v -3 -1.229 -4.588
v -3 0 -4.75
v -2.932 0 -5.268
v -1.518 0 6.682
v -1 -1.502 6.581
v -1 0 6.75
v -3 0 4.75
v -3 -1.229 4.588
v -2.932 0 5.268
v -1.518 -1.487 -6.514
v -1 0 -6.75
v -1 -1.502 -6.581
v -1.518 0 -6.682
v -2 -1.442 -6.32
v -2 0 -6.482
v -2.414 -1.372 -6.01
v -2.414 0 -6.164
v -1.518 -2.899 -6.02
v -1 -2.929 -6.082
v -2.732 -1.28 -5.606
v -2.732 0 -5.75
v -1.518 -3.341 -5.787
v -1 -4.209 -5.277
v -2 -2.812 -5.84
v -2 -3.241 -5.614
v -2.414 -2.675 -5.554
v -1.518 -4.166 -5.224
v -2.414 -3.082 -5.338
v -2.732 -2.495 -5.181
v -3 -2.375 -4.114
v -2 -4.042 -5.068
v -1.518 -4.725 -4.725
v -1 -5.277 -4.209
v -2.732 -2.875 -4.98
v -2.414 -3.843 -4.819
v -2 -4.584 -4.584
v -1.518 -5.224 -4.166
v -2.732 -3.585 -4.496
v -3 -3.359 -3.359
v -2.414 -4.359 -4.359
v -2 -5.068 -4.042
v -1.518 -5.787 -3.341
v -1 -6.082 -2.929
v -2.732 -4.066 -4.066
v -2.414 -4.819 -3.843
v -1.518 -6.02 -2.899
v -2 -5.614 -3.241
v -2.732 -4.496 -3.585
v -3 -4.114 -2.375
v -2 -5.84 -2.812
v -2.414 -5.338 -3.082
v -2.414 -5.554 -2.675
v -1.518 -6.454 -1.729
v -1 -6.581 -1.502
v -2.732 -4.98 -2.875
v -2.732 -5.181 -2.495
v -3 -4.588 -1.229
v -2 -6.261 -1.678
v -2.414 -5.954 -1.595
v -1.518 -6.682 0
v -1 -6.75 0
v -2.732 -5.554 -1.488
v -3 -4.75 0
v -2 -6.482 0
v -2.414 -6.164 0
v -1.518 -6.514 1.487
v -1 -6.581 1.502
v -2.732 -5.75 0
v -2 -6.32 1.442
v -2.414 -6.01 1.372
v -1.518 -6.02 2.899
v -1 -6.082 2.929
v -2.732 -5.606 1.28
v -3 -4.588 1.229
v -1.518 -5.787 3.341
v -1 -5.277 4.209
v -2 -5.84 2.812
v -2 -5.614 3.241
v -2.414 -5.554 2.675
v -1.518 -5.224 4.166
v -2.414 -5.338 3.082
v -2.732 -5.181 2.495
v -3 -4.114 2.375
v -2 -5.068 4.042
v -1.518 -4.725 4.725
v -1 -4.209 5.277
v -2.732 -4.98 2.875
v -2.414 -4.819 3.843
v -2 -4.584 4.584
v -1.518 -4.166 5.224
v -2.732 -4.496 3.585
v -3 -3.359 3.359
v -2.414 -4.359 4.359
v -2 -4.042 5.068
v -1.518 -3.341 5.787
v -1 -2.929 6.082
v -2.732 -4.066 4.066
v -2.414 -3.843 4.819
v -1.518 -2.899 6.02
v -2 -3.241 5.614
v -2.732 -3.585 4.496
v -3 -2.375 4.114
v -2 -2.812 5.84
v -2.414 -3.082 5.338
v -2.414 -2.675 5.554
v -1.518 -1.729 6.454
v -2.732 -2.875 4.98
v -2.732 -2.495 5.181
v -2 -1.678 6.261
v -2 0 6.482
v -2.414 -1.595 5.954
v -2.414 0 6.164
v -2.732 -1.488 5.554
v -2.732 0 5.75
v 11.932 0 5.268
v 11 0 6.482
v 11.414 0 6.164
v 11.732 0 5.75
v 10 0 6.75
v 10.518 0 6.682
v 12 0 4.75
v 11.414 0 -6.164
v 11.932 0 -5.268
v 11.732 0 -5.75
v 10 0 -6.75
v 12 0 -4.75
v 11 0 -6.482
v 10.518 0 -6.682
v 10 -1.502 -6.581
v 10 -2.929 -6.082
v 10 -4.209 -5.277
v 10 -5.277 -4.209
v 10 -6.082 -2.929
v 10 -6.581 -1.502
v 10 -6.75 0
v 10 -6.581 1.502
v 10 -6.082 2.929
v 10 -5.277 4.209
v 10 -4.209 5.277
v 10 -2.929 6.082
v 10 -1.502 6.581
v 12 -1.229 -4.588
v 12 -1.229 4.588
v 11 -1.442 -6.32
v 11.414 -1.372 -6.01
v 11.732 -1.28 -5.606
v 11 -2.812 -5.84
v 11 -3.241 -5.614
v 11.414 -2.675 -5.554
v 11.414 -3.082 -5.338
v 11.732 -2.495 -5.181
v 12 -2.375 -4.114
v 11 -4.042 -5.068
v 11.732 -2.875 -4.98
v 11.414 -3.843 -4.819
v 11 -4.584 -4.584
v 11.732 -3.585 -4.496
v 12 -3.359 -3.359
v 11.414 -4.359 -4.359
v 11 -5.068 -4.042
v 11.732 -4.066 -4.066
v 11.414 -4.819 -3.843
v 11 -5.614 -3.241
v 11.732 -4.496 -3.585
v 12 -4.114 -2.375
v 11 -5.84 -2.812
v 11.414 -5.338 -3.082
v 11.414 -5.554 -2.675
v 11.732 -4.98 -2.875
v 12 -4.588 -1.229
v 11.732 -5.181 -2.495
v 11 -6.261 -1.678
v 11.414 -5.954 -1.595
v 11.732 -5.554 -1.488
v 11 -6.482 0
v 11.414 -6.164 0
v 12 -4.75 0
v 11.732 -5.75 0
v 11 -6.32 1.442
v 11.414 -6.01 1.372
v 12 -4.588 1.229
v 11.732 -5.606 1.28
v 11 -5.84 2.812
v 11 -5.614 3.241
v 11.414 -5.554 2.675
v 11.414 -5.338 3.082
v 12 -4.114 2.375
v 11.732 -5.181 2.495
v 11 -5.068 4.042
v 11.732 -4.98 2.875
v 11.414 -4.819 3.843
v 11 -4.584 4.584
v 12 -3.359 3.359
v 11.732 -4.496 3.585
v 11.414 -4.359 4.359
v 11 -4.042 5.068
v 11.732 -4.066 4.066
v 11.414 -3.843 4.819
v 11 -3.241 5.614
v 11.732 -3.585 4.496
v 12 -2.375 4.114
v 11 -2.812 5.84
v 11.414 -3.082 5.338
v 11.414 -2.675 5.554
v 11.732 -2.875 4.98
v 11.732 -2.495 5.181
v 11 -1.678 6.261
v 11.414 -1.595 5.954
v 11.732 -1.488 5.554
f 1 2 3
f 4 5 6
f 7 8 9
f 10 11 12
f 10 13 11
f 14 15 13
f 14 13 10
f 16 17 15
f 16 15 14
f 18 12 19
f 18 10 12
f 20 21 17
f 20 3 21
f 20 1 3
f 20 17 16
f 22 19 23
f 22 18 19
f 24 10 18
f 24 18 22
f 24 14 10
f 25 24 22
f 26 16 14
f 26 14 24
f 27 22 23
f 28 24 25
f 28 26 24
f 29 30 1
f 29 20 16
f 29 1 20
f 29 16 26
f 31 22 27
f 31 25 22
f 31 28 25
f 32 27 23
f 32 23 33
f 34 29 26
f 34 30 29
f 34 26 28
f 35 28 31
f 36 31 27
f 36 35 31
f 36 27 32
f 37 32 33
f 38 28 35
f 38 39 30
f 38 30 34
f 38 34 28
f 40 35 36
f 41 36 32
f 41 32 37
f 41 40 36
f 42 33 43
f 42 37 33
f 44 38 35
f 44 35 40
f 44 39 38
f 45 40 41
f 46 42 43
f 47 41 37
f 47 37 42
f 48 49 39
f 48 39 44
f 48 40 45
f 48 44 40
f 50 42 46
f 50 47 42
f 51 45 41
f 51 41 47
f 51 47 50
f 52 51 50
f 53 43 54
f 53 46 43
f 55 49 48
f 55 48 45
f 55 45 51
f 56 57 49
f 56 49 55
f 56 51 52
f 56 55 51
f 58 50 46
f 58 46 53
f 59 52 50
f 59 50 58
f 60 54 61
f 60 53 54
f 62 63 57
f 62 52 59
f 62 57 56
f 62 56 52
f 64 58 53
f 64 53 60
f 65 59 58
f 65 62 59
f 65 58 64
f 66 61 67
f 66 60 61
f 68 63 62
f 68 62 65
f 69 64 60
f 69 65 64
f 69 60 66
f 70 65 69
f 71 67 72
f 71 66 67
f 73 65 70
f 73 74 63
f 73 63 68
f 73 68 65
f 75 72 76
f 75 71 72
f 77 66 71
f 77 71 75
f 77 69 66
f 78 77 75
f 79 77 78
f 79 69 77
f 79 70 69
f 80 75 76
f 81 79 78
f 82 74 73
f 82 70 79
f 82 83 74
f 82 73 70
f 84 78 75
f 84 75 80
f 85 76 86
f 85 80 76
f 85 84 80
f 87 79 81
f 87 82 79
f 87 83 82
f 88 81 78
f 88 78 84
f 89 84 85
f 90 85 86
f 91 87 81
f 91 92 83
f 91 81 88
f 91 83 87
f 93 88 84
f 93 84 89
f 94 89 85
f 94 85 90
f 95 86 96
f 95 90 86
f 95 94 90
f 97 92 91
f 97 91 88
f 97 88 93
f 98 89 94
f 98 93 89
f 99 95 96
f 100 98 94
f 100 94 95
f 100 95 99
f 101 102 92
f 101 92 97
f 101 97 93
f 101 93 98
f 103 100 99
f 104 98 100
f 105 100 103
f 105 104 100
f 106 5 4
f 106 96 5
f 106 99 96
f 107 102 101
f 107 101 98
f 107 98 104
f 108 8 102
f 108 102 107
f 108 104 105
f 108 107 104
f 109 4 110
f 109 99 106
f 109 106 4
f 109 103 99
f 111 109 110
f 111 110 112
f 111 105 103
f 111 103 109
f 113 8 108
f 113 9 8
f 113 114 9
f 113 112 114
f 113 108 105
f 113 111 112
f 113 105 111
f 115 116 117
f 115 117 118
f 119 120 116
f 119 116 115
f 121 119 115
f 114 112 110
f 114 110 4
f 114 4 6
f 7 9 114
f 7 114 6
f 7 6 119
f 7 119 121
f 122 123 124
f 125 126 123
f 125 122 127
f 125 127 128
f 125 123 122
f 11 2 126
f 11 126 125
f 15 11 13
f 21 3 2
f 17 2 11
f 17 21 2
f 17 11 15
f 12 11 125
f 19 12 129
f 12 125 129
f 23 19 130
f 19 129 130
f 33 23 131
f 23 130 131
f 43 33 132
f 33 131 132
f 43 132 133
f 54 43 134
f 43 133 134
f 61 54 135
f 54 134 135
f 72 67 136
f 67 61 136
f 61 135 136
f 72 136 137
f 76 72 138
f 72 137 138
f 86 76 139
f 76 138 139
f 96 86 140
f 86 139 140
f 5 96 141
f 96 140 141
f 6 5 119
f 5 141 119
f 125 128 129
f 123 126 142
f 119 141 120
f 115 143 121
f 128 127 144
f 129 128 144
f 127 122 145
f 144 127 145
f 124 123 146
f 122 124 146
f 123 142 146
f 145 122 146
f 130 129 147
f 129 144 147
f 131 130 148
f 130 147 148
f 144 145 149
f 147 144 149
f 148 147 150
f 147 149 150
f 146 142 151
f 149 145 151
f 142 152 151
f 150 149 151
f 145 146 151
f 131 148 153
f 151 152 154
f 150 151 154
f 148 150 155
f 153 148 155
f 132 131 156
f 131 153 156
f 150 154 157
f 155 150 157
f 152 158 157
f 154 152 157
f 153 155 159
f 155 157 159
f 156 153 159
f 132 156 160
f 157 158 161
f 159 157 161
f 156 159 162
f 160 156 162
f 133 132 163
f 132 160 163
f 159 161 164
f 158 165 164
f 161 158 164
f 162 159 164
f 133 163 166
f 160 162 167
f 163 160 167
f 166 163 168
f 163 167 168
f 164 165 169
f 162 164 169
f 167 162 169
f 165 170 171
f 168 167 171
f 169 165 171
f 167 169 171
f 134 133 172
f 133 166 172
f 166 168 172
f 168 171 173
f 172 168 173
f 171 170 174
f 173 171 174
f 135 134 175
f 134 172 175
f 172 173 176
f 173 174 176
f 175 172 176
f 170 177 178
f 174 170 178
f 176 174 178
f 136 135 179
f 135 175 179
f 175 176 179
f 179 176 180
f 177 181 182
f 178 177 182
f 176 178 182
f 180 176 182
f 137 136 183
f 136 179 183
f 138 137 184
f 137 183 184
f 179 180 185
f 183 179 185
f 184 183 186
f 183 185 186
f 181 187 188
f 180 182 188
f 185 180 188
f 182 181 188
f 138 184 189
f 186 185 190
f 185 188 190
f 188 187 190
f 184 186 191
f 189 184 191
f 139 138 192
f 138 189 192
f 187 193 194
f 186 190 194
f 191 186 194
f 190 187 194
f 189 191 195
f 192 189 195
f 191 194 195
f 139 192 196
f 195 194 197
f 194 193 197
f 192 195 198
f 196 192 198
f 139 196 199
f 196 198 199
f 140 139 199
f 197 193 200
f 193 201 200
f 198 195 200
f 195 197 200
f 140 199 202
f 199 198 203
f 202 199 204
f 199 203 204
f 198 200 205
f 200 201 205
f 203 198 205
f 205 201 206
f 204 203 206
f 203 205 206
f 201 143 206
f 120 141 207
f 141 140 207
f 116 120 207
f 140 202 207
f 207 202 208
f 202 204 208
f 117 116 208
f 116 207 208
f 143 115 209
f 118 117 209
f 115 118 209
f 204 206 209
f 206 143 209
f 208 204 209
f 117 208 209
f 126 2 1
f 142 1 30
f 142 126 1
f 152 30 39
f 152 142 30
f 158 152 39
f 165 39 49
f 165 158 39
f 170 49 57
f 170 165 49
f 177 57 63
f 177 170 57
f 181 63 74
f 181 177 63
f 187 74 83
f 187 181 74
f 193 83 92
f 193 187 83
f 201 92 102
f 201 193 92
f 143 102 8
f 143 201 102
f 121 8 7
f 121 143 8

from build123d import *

# Parameters (mm, degrees)
SKETCH4_R               = 6.75
SKETCH4_R_2             = 4.75
BOSS_EXTRUDE4_DEPTH     = 15
FILLET3_R               = 2
FILLET4_R               = 2
CUT_EXTRUDE1_DEPTH      = 16.333786269
CUT_EXTRUDE1_DEPTH_BACK = 16.333786269


with BuildPart() as part:
    # Sketch4 → Boss-Extrude4 (new body)
    with BuildSketch(Plane.ZY.offset(-12)):
        with Locations(Location((0, 0, 0), (0, 0, 270))):
            Circle(SKETCH4_R)
        with Locations(Location((0, 0, 0), (0, 0, 270))):
            Circle(SKETCH4_R_2, mode=Mode.SUBTRACT)
    extrude(amount=BOSS_EXTRUDE4_DEPTH)

    # Fillet3
    fillet3_edges = [part.edges().sort_by_distance(p)[0] for p in [
        (12, 6.75, 0),
    ]]
    fillet(fillet3_edges, radius=FILLET3_R - 0.0001)  # a hair under: the kernel refuses the full size

    # Fillet4
    fillet4_edges = [part.edges().sort_by_distance(p)[0] for p in [
        (-3, 6.75, 0),
    ]]
    fillet(fillet4_edges, radius=FILLET4_R - 0.0001)  # a hair under: the kernel refuses the full size

    # Sketch5 → Cut-Extrude1 (cut, two sides: drawn at the far end of the back side and taken through both)
    with BuildSketch(Plane(origin=(0, 0, 0), x_dir=(0, 0, -1), z_dir=(1, 0, 0)).offset(-CUT_EXTRUDE1_DEPTH_BACK)):
        with BuildLine():
            ThreePointArc((6.75, 0), (0, 6.75), (-6.75, 0))
            Line((-6.75, 0), (-4.75, 0))
            ThreePointArc((-4.75, 0), (0, 4.75), (4.75, 0))
            Line((4.75, 0), (6.75, 0))
        make_face()
    extrude(amount=CUT_EXTRUDE1_DEPTH + CUT_EXTRUDE1_DEPTH_BACK, mode=Mode.SUBTRACT)


solid = part.part
